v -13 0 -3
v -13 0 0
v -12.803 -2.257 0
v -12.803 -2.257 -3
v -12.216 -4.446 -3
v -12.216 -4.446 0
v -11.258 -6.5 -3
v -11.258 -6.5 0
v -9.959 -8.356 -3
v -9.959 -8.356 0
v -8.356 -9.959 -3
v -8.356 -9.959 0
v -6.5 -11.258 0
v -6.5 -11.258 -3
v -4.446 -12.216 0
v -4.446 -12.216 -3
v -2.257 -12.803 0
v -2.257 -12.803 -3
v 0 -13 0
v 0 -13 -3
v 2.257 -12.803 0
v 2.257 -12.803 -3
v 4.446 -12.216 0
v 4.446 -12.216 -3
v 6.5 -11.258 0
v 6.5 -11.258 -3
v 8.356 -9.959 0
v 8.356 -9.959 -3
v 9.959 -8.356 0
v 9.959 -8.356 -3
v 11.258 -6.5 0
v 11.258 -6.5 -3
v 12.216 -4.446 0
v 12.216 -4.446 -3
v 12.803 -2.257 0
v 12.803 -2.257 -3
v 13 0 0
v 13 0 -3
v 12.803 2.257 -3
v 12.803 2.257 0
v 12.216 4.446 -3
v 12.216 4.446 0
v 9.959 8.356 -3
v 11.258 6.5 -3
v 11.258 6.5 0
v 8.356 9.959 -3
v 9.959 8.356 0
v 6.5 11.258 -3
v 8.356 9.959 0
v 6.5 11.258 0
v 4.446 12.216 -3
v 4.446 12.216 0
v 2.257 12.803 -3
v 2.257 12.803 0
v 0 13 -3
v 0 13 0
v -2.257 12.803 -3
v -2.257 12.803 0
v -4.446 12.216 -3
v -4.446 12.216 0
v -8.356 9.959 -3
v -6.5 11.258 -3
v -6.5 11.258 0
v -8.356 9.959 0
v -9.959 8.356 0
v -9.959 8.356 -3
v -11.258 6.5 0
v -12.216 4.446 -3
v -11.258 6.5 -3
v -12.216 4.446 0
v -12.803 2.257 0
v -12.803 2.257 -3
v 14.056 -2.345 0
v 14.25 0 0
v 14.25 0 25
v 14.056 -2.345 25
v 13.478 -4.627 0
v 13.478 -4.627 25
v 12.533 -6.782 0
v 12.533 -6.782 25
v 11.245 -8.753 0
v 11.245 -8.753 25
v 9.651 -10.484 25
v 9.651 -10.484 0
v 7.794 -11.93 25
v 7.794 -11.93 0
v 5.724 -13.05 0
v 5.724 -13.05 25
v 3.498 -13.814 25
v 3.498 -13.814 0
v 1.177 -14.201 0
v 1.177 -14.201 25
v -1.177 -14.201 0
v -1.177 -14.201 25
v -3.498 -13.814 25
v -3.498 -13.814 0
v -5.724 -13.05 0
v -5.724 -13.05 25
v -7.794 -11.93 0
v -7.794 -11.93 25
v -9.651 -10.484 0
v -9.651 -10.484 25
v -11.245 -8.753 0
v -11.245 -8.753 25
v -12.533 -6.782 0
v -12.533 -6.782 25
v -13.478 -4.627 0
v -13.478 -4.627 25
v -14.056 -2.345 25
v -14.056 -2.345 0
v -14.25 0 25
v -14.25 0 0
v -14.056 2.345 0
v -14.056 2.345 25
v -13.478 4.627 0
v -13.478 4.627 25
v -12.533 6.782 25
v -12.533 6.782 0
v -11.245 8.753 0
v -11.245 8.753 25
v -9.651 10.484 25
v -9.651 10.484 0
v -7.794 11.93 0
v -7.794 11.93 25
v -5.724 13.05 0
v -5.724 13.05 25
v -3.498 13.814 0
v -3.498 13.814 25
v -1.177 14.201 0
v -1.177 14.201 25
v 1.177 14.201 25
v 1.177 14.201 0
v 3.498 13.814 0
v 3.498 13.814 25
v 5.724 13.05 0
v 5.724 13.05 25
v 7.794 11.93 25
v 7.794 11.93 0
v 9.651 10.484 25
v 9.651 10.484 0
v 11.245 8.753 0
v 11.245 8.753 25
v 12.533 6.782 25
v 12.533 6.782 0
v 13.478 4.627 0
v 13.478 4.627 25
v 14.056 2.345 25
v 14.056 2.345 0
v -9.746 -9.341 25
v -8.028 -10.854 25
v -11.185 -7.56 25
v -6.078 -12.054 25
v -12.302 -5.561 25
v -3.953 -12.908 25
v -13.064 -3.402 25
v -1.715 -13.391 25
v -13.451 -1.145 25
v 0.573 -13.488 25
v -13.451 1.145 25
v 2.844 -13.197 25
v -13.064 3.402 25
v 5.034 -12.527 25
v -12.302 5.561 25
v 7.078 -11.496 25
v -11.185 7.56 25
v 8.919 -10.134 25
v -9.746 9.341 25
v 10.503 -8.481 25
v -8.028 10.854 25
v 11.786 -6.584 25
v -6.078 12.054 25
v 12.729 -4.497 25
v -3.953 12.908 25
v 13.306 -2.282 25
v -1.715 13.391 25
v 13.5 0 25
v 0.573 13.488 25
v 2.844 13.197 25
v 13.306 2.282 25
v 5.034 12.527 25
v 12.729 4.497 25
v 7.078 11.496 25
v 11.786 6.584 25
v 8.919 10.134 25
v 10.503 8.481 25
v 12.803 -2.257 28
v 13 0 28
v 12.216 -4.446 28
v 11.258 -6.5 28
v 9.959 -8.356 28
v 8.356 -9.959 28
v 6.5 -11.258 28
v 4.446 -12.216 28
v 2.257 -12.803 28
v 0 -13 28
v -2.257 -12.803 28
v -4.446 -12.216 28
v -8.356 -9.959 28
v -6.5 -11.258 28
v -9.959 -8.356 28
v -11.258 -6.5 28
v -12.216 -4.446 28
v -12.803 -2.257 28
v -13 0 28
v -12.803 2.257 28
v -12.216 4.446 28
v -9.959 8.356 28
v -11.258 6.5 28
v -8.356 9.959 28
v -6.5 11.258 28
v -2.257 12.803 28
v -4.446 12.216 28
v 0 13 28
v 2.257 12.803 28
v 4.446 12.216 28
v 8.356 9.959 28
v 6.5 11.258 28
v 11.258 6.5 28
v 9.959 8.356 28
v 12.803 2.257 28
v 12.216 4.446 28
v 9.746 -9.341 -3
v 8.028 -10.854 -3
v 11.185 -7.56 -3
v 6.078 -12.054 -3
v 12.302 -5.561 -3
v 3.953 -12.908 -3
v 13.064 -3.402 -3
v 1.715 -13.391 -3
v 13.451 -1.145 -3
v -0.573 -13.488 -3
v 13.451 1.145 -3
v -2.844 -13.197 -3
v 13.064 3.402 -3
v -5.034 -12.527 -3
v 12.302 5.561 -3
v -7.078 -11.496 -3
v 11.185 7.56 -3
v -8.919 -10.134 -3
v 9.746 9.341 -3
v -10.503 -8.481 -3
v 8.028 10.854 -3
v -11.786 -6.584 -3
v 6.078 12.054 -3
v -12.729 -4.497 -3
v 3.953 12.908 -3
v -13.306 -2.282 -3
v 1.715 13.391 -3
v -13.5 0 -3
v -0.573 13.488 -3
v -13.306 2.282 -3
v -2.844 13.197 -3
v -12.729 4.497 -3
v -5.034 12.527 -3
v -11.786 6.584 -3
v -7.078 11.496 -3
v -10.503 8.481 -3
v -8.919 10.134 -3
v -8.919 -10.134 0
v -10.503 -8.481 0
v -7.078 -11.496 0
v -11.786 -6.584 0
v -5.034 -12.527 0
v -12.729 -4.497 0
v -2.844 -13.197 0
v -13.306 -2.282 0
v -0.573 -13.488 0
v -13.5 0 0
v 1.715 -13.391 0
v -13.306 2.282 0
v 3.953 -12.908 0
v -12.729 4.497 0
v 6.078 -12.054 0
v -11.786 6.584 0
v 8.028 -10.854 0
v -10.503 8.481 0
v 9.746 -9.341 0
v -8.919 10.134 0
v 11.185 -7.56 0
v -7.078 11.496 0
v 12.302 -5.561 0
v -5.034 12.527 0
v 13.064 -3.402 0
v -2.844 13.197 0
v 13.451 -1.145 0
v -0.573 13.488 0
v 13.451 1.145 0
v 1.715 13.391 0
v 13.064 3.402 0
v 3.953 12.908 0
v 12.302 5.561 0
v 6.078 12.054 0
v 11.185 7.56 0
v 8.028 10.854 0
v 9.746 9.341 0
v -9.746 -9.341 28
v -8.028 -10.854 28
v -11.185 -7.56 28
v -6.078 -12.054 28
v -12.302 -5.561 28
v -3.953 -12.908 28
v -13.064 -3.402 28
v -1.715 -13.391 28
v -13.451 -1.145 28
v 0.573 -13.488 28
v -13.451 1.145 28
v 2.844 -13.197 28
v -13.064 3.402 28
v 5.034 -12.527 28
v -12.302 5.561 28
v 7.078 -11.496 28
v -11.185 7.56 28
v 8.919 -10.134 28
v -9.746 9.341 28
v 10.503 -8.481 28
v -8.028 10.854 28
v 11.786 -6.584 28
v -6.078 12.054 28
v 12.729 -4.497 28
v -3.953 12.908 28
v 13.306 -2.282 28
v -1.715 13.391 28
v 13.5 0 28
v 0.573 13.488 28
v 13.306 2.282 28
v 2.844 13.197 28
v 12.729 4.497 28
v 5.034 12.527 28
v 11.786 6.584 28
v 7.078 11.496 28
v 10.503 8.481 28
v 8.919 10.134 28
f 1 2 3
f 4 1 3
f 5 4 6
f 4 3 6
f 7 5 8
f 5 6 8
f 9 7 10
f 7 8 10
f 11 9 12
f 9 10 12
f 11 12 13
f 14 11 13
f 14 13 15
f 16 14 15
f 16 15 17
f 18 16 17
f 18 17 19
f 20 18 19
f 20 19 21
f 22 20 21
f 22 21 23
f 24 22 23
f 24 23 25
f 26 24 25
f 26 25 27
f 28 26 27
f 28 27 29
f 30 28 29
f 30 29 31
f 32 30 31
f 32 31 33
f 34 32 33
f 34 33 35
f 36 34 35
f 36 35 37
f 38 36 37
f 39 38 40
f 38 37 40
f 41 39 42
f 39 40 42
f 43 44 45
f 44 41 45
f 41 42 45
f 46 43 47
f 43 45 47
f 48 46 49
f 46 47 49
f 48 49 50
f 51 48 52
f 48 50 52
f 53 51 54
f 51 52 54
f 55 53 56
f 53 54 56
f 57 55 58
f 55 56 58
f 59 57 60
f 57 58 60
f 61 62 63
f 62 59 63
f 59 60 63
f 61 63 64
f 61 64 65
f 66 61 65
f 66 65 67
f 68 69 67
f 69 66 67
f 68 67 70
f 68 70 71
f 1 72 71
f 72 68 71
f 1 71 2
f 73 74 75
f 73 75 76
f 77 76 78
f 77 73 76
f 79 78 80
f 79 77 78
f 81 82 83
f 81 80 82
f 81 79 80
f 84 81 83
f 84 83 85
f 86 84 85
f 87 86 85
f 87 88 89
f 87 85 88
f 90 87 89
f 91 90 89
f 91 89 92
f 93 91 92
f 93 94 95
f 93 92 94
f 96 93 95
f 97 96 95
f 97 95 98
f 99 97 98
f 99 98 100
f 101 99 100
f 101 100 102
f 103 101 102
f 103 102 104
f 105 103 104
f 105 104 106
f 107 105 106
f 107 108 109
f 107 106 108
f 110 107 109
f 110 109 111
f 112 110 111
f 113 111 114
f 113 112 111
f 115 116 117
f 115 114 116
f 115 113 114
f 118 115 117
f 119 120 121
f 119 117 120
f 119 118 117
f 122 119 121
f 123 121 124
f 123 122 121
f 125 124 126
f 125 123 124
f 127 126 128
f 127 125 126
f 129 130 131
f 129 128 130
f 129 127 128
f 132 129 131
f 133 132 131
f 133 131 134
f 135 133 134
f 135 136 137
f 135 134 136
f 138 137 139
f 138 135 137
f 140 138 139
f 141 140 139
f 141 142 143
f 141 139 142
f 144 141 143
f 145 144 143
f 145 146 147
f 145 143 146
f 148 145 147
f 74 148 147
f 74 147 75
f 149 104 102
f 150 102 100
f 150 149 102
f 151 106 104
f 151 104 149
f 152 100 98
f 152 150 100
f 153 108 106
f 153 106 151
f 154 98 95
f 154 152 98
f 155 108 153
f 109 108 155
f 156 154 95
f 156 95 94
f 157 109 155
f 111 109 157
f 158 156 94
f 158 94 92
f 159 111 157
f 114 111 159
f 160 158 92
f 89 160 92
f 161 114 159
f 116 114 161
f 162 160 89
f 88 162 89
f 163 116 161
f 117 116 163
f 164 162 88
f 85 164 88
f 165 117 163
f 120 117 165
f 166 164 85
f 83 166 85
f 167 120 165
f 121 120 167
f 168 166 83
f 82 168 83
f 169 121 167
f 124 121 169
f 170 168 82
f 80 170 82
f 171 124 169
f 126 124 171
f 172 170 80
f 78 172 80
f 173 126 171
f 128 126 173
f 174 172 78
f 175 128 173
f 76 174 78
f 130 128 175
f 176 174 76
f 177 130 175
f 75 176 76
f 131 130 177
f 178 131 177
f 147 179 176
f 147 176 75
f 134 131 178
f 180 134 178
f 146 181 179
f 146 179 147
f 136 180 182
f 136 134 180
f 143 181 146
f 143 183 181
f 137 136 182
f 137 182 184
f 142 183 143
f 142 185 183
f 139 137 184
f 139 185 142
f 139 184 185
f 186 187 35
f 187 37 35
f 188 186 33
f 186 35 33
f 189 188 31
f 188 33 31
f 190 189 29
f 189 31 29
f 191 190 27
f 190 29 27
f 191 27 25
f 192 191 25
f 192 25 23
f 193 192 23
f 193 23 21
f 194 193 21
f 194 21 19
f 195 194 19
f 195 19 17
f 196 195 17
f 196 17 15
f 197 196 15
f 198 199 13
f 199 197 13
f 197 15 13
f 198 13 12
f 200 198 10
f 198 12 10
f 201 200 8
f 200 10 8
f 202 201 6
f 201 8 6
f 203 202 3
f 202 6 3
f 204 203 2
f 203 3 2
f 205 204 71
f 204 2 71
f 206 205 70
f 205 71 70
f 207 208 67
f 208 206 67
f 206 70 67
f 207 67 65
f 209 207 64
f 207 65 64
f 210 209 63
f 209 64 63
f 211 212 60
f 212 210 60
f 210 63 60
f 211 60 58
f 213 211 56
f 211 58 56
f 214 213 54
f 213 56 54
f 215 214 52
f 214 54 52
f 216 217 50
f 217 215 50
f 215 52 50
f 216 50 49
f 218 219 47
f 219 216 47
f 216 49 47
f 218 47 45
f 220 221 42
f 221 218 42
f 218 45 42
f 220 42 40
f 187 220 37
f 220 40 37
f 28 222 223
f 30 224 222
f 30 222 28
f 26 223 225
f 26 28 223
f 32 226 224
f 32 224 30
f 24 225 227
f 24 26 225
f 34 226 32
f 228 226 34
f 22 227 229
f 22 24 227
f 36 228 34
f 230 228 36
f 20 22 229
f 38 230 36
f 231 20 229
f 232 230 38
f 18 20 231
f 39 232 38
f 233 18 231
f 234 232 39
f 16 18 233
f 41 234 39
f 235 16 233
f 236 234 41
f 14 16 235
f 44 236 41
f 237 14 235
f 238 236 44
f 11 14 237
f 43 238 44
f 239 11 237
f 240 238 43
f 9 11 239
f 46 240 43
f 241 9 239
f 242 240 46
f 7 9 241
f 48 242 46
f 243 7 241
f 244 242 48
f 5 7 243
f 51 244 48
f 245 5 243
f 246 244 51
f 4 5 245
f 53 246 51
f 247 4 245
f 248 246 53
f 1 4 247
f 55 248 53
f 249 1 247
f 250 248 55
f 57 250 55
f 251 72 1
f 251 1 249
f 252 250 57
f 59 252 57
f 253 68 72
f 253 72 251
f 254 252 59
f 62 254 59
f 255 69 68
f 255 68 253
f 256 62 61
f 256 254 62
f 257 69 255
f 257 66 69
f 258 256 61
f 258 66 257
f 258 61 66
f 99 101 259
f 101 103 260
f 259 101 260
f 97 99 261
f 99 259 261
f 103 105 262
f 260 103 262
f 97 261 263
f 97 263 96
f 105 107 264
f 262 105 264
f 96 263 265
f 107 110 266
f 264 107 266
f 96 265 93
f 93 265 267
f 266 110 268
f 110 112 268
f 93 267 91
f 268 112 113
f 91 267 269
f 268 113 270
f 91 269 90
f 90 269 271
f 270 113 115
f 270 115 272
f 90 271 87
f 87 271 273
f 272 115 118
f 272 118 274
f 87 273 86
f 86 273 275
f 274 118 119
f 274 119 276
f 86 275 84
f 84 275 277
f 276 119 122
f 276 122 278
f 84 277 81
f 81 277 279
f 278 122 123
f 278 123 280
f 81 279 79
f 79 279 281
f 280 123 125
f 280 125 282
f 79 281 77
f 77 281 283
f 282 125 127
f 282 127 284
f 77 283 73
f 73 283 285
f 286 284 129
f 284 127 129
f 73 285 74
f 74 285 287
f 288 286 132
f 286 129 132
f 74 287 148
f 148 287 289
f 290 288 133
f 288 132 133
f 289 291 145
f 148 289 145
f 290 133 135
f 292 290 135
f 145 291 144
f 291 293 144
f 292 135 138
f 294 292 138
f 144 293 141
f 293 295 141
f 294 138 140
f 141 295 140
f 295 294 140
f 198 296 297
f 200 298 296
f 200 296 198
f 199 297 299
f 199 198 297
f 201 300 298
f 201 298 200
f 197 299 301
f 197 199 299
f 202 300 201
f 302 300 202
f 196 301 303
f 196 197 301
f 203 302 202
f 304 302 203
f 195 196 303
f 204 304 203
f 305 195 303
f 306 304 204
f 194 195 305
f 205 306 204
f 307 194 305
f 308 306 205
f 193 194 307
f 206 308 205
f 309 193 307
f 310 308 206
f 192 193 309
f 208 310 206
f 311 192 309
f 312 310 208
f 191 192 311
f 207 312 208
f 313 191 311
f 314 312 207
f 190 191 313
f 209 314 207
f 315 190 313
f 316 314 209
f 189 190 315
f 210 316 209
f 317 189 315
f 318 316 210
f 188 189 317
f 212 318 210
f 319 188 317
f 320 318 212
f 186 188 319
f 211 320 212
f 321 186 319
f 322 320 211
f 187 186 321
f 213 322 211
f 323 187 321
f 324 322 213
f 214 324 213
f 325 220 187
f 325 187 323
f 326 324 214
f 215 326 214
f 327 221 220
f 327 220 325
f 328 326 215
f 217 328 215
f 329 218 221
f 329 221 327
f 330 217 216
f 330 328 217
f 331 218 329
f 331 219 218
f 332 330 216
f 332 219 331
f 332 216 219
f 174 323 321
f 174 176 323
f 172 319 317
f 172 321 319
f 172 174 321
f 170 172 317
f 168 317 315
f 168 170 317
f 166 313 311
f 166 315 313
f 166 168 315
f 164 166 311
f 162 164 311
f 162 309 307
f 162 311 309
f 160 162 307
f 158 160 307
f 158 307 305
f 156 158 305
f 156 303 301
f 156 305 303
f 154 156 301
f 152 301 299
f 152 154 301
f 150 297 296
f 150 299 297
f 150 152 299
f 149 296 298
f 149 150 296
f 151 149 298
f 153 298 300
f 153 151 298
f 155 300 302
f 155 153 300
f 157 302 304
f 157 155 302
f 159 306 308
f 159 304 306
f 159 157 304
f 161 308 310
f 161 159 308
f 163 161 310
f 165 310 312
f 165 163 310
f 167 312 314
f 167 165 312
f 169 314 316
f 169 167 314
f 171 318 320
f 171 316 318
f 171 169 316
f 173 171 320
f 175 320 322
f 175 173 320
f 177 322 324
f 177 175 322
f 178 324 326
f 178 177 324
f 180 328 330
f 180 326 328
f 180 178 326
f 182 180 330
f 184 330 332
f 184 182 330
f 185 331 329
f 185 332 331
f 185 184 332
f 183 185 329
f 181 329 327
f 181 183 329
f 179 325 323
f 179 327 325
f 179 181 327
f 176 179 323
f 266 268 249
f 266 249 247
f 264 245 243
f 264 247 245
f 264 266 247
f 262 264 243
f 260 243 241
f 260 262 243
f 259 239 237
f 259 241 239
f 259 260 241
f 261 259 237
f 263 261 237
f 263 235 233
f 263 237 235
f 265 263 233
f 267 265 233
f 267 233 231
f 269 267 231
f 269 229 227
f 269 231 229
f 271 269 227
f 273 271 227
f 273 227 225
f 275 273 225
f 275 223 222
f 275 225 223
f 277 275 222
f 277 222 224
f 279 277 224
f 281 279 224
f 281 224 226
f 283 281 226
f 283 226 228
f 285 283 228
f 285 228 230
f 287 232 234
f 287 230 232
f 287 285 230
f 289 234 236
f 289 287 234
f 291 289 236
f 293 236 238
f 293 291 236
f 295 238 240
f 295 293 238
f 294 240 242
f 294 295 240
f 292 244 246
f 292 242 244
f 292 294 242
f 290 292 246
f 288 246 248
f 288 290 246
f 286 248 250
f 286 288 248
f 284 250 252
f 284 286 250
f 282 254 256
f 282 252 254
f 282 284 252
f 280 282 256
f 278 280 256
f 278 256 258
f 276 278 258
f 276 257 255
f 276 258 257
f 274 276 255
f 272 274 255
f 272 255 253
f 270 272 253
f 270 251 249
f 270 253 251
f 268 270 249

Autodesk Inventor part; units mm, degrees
ref_plane "YZ Plane" through (0, 0, 0) normal (1, 0, 0) x (0, 1, 0)
ref_plane "XZ Plane" through (0, 0, 0) normal (0, 1, 0) x (-1, 0, 0)
sketch "Sketch1" plane through (0, 0, 0) normal (0, 0, 1) x (1, 0, 0)
  arc A0 (-4.218, 13.0871) -> (12.3207, -6.1043) centre (0, 0) ccw projected
  circle A1 centre (0, 0) radius 14.25
  circle A2 centre (0, 0) radius 13
  point P0 (0, 0)
  dimension "d0" = 28.5
  dimension "d1" = 26
ref_plane "Work Plane1" through (-15.0438, -15.0438, 25) normal (0, 0, -1) x (0, 1, 0)
extrude "Extrusion1" add sketch "Sketch1" along normal up to surface (25 mm away)
sketch "Sketch2" plane through (0, 0, 25) normal (0, 0, 1) x (1, 0, 0)
  circle A0 centre (0, 0) radius 13.5
  circle A1 centre (0, 0) radius 13 projected
  circle A2 centre (0, 0) radius 13 projected
  dimension "d4" = 27
extrude "Extrusion2" add sketch "Sketch2" along normal blind 3
sketch "Sketch3" plane through (0, 0, 0) normal (0, 0, -1) x (-1, 0, 0)
  circle A0 centre (0, 0) radius 13 projected
  circle A1 centre (0, 0) radius 13.5 projected
  point P0 (0, 0)
extrude "Extrusion3" add sketch "Sketch3" along normal blind 3
properties part number "30_CUBE_openVCM_voicecoil"
